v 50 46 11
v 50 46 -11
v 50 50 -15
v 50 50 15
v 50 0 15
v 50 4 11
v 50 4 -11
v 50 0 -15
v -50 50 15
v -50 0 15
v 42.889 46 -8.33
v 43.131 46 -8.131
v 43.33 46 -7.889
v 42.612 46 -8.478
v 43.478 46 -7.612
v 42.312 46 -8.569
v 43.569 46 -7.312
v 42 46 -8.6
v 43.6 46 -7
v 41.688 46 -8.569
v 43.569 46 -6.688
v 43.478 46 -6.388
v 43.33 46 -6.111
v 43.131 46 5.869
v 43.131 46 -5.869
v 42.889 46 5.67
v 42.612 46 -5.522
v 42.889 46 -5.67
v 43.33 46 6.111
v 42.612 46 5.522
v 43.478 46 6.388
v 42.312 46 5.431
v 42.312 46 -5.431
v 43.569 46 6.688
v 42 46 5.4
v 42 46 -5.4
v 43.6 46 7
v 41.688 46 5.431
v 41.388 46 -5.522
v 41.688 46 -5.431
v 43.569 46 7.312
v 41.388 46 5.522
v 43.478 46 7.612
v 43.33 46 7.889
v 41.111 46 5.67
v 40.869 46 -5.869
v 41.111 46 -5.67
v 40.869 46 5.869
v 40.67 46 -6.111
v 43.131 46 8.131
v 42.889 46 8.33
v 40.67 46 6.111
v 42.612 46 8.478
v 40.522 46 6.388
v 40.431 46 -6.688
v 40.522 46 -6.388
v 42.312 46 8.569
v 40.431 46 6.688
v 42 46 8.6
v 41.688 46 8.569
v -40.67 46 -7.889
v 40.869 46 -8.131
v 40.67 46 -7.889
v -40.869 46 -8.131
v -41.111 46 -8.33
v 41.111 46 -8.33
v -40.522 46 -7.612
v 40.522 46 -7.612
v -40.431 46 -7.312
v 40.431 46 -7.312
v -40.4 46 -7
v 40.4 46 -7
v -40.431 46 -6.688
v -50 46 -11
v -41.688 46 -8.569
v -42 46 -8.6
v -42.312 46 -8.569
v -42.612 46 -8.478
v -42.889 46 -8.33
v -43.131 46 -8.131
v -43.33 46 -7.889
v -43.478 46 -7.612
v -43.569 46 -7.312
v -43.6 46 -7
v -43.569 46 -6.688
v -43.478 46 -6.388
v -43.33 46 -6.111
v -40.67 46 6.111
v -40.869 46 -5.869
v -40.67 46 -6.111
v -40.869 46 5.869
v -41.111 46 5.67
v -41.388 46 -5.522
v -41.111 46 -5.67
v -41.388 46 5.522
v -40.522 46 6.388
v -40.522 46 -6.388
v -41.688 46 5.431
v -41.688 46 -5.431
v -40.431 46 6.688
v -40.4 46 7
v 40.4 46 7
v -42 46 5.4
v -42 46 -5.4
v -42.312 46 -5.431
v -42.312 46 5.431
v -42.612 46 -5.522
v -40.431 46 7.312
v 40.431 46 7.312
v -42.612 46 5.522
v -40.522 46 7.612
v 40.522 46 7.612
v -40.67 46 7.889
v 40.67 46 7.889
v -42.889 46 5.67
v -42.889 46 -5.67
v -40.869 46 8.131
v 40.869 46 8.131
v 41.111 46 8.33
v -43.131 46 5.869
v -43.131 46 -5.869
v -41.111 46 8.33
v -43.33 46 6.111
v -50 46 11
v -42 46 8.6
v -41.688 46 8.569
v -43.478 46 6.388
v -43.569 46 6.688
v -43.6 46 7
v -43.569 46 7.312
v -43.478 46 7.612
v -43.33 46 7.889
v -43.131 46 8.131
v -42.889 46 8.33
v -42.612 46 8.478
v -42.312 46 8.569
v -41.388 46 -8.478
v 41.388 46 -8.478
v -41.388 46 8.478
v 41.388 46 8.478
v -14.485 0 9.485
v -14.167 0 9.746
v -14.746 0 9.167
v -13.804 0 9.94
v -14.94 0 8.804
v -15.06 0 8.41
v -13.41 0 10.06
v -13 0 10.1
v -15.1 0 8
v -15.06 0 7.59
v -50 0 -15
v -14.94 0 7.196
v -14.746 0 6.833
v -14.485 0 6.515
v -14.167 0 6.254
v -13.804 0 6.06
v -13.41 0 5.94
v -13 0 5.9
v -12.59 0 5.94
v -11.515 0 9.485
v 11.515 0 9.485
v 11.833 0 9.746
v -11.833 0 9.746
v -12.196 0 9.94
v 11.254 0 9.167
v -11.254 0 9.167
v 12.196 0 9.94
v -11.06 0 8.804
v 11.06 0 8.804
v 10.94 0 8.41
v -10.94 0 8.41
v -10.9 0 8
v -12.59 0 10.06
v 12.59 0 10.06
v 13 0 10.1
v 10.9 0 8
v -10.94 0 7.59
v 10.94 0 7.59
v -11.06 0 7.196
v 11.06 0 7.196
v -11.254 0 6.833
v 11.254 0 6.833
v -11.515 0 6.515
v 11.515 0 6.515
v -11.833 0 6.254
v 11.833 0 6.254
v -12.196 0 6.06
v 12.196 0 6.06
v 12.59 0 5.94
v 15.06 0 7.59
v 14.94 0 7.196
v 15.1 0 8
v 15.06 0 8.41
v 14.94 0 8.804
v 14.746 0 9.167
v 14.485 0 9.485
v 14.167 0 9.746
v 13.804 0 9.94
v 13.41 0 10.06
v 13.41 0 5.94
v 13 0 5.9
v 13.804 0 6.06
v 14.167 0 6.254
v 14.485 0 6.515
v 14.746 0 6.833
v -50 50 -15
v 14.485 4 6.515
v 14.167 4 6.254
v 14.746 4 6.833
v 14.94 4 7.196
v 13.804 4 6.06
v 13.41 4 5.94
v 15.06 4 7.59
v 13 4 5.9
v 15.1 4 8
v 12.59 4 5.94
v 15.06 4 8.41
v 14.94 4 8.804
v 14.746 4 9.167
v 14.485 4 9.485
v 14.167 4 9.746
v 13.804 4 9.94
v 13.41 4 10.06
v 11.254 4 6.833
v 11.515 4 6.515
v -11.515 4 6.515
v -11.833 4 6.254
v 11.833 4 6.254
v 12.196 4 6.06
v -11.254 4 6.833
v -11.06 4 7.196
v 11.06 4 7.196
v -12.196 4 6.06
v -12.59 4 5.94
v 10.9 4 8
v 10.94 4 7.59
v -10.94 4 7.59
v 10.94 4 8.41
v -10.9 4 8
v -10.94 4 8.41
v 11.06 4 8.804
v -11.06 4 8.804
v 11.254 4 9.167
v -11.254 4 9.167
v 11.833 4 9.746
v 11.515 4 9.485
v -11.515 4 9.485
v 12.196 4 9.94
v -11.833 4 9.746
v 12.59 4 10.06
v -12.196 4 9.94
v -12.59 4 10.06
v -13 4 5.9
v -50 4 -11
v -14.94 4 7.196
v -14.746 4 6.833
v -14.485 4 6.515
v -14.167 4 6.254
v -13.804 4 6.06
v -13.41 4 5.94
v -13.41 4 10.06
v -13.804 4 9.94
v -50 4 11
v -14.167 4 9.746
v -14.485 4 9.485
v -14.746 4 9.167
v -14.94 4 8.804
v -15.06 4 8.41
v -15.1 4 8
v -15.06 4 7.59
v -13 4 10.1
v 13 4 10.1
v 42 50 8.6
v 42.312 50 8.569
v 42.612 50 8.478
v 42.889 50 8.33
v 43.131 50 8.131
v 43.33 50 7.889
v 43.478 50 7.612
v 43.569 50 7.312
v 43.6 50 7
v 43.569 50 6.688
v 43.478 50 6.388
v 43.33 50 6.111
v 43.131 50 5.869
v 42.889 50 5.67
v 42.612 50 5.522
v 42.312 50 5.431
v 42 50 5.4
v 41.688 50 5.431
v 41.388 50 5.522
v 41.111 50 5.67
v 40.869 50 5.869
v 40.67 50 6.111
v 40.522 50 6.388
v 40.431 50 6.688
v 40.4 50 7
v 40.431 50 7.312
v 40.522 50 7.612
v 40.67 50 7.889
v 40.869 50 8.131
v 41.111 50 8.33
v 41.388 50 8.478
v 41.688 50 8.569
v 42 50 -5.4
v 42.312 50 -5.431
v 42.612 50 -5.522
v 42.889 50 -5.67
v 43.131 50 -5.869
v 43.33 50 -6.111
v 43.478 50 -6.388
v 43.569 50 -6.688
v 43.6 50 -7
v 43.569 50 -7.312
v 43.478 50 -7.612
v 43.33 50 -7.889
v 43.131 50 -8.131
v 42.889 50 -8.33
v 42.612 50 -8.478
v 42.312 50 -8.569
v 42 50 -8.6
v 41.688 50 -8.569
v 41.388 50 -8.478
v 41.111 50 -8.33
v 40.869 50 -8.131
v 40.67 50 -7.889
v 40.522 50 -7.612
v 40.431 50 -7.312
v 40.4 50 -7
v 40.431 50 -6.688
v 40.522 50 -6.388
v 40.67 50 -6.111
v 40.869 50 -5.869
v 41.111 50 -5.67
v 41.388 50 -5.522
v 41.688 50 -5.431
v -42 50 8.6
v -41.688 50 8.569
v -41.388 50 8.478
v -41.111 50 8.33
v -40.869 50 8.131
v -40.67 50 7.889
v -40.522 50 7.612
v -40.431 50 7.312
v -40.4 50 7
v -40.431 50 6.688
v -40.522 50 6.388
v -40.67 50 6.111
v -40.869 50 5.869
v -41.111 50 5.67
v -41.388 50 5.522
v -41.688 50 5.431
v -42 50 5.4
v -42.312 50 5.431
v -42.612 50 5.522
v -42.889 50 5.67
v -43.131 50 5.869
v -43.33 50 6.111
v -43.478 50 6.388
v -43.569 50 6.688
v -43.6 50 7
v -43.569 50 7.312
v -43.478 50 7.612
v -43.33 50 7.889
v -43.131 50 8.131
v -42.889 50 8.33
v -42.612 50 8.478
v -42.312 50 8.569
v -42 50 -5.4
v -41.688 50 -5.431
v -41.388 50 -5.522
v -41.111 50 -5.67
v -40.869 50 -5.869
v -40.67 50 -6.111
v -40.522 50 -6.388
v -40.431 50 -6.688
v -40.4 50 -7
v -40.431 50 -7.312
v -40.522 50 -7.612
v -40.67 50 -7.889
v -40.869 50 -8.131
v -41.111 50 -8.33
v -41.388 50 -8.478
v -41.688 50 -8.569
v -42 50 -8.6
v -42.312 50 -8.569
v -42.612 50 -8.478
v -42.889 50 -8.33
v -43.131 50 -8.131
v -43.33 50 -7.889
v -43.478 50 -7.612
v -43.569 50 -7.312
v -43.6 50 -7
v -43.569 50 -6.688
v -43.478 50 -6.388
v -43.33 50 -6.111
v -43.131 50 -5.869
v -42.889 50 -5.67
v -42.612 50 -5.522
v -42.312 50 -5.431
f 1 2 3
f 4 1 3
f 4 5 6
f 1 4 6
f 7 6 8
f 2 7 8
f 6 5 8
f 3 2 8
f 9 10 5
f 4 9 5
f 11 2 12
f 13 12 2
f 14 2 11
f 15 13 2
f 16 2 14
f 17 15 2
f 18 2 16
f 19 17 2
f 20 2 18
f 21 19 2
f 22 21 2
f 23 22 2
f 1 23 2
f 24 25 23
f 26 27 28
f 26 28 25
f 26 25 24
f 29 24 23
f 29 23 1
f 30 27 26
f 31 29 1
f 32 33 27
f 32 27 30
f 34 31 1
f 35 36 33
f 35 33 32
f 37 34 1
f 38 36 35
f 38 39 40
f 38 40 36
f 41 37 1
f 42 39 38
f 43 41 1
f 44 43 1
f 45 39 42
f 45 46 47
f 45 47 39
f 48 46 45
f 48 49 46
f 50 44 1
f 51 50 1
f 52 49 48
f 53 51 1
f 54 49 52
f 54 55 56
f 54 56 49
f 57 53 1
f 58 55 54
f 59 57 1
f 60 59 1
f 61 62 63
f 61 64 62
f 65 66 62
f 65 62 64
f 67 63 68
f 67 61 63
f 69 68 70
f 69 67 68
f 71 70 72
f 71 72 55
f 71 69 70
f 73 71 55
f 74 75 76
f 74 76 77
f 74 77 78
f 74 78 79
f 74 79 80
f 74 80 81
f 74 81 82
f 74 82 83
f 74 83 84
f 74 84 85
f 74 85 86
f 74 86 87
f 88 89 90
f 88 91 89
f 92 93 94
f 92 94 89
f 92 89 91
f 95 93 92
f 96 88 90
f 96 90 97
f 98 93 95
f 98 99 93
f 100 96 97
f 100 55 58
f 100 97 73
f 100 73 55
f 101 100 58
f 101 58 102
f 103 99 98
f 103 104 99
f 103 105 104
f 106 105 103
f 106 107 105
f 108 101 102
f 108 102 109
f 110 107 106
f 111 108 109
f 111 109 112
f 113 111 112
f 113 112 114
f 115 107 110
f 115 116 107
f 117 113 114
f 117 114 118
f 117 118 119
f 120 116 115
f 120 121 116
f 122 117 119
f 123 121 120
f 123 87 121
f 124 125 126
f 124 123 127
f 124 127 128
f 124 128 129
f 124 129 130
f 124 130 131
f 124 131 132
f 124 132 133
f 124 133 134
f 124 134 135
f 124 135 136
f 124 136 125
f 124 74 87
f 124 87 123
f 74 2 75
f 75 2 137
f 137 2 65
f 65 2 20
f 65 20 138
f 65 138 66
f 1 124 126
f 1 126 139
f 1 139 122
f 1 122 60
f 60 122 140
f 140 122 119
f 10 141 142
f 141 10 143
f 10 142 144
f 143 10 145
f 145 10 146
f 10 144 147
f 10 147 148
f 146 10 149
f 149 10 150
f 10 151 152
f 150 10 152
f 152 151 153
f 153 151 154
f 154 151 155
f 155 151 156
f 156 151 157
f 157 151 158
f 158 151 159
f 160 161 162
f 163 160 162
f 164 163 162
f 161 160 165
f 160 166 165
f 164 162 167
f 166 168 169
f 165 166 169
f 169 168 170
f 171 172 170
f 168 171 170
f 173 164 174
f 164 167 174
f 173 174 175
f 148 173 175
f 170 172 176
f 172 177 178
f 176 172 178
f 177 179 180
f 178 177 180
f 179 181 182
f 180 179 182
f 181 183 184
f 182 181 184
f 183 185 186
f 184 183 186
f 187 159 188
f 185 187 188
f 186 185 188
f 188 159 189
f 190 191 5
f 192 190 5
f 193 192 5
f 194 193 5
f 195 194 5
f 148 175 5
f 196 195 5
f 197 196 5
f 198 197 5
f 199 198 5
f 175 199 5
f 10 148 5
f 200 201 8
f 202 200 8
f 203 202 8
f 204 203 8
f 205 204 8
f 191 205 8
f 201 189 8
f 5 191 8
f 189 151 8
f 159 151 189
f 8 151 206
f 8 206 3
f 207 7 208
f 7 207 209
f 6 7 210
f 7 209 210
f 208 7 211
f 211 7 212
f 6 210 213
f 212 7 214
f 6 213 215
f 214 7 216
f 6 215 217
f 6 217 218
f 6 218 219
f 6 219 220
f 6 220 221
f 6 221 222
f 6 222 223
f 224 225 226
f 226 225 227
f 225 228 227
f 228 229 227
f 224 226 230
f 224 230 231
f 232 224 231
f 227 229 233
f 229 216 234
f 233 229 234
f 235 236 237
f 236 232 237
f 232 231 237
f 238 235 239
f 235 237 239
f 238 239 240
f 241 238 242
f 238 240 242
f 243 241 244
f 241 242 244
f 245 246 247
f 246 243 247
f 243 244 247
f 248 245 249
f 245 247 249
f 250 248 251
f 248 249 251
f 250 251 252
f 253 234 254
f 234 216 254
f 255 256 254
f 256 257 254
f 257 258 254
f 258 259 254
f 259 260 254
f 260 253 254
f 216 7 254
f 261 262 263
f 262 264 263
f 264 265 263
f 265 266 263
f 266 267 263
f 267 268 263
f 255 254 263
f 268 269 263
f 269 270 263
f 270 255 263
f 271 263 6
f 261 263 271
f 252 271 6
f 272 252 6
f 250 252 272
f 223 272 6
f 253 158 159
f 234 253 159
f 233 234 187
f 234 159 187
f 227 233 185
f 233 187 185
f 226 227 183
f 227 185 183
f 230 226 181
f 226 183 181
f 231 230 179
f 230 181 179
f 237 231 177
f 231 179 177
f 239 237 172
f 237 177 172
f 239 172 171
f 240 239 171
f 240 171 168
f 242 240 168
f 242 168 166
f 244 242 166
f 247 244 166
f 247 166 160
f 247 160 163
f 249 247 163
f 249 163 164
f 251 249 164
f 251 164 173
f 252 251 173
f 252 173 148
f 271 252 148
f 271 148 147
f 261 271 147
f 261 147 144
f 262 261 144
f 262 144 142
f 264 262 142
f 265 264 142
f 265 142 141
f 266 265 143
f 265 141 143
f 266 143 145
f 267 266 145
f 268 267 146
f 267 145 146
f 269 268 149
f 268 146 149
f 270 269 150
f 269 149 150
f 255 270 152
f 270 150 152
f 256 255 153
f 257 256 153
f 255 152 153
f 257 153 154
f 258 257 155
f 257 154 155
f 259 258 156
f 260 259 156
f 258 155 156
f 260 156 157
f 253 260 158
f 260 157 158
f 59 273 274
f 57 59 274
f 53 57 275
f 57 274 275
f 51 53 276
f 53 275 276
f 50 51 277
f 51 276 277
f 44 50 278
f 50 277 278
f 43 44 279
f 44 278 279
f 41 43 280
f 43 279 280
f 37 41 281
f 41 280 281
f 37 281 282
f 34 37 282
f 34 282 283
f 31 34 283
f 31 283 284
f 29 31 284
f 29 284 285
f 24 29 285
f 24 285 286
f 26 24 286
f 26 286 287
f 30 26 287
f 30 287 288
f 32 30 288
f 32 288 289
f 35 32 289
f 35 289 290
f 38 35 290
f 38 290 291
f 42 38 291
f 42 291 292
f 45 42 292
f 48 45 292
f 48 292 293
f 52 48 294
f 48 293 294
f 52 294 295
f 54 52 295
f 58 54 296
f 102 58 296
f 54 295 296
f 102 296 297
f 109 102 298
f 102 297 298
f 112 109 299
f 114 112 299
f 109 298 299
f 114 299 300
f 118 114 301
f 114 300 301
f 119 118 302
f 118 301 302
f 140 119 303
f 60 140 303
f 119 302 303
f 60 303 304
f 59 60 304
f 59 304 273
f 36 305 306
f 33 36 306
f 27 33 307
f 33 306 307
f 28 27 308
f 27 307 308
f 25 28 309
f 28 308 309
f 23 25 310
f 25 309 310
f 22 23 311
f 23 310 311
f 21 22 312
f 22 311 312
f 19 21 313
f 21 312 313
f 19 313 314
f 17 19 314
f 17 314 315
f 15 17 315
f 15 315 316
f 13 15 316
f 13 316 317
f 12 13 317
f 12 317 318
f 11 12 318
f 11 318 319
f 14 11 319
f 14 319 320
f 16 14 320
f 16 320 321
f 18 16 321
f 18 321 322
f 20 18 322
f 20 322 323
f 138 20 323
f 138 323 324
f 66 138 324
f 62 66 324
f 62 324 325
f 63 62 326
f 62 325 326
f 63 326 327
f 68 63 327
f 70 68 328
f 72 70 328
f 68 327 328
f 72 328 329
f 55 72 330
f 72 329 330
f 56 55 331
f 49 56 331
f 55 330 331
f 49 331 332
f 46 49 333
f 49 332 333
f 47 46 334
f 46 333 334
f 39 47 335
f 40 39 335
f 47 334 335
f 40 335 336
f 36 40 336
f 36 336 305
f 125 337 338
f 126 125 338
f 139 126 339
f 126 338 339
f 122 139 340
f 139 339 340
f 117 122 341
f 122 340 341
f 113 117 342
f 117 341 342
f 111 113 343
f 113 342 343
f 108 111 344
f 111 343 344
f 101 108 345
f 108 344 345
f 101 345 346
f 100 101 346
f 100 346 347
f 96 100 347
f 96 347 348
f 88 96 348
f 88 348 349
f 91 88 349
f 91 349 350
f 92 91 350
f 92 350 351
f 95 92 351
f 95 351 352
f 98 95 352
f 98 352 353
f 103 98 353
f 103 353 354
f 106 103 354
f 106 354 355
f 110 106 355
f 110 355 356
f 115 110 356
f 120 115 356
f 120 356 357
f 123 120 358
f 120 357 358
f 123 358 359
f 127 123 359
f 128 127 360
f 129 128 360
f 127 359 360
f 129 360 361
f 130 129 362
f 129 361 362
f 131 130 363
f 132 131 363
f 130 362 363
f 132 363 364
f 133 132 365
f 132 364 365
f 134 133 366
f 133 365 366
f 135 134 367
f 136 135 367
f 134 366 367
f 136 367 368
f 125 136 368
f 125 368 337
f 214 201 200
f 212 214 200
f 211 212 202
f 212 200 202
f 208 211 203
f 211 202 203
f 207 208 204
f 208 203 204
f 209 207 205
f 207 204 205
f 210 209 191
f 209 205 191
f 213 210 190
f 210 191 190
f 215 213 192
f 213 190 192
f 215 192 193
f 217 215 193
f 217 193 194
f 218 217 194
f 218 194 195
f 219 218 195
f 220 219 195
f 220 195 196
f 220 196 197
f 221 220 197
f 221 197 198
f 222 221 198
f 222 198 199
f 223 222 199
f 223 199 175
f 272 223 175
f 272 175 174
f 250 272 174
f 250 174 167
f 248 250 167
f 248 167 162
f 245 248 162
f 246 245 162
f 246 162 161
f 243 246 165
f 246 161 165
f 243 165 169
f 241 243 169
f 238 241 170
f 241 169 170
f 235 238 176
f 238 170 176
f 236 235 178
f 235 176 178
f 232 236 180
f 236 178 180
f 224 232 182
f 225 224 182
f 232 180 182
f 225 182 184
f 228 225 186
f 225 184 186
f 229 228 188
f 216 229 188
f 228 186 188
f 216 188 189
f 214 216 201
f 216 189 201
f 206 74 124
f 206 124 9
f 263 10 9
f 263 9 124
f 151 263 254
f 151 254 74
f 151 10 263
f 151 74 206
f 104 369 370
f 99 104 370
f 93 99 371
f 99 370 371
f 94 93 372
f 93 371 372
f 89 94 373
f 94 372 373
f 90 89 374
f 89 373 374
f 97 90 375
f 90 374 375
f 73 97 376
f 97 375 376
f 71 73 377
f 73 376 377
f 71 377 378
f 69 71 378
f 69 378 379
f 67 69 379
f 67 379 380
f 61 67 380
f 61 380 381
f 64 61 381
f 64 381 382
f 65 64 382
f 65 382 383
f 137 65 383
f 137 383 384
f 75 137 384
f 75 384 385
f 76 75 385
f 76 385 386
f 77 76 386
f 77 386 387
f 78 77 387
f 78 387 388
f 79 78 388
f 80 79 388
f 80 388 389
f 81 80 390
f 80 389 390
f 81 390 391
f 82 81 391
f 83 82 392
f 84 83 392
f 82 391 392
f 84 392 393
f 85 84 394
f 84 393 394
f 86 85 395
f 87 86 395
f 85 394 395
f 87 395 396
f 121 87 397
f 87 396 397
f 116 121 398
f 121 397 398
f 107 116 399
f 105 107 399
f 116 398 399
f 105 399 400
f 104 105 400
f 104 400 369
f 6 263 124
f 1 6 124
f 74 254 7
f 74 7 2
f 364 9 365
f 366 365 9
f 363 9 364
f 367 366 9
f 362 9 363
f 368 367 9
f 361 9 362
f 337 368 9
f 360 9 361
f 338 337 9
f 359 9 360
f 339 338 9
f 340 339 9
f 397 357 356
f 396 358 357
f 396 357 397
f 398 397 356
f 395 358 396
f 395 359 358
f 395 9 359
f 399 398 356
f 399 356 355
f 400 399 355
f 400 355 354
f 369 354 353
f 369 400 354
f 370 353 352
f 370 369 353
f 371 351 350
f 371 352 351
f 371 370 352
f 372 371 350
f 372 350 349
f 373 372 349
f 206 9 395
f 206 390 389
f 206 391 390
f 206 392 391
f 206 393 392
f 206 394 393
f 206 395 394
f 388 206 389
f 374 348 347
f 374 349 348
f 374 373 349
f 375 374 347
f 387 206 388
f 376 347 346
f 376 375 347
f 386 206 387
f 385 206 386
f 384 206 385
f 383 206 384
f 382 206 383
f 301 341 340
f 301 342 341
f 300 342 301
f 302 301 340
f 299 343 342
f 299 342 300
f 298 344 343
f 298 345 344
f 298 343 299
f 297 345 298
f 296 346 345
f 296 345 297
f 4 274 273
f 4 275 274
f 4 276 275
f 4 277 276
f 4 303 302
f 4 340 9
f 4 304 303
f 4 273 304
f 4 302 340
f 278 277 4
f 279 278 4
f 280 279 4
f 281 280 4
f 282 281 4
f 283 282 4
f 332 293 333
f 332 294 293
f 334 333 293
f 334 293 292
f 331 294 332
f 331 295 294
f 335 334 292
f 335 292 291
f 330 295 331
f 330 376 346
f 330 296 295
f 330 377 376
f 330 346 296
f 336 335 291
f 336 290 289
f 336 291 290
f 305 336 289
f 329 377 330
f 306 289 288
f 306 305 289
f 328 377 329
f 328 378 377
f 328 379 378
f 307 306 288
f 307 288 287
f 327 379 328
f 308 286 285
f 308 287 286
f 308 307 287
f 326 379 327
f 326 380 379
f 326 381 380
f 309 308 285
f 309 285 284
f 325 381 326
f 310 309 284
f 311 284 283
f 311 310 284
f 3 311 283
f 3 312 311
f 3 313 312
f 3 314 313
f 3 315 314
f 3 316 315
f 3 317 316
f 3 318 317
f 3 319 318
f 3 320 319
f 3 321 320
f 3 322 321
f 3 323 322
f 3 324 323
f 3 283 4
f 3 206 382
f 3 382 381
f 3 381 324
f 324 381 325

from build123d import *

# Parameters (mm, degrees)
SKETCH_1_W          = 100
SKETCH_1_H          = 30
EXTRUDE_1_DEPTH     = 50
SKETCH_2_W          = 22
SKETCH_2_H          = 42
CUT_EXTRUDE_1_DEPTH = 113.805141727
SKETCH_3_R          = 2.1
CUT_EXTRUDE_3_DEPTH = 20
SKETCH_4_R          = 1.6
CUT_EXTRUDE_4_DEPTH = 20


with BuildPart() as part:
    # 草图1 → 凸台-拉伸1 (new body)
    with BuildSketch(Plane(origin=(0, 0, 0), x_dir=(1, 0, 0), z_dir=(0, 1, 0))):
        Rectangle(SKETCH_1_W, SKETCH_1_H)
    extrude(amount=EXTRUDE_1_DEPTH)

    # 草图2 → 切除-拉伸1 (cut, through all)
    with BuildSketch(Plane.ZY.offset(50)):
        with Locations((0, 25)):
            Rectangle(SKETCH_2_W, SKETCH_2_H)
    extrude(amount=-CUT_EXTRUDE_1_DEPTH, mode=Mode.SUBTRACT)

    # 草图3 → 切除-拉伸3 (cut)
    with BuildSketch(Plane.XZ):
        with Locations(Location((13, 8, 0), (0, 0, 270))):
            Circle(SKETCH_3_R)
        with Locations(Location((-13, 8, 0), (0, 0, 270))):
            Circle(SKETCH_3_R)
    extrude(amount=-CUT_EXTRUDE_3_DEPTH, mode=Mode.SUBTRACT)

    # 草图4 → 切除-拉伸4 (cut)
    with BuildSketch(Plane(origin=(0, 50, 0), x_dir=(1, 0, 0), z_dir=(0, 1, 0))):
        with Locations(Location((-42, 7, 0), (0, 0, 270))):
            Circle(SKETCH_4_R)
        with Locations(Location((-42, -7, 0), (0, 0, 270))):
            Circle(SKETCH_4_R)
        with Locations(Location((42, 7, 0), (0, 0, 270))):
            Circle(SKETCH_4_R)
        with Locations(Location((42, -7, 0), (0, 0, 270))):
            Circle(SKETCH_4_R)
    extrude(amount=-CUT_EXTRUDE_4_DEPTH, mode=Mode.SUBTRACT)


solid = part.part
